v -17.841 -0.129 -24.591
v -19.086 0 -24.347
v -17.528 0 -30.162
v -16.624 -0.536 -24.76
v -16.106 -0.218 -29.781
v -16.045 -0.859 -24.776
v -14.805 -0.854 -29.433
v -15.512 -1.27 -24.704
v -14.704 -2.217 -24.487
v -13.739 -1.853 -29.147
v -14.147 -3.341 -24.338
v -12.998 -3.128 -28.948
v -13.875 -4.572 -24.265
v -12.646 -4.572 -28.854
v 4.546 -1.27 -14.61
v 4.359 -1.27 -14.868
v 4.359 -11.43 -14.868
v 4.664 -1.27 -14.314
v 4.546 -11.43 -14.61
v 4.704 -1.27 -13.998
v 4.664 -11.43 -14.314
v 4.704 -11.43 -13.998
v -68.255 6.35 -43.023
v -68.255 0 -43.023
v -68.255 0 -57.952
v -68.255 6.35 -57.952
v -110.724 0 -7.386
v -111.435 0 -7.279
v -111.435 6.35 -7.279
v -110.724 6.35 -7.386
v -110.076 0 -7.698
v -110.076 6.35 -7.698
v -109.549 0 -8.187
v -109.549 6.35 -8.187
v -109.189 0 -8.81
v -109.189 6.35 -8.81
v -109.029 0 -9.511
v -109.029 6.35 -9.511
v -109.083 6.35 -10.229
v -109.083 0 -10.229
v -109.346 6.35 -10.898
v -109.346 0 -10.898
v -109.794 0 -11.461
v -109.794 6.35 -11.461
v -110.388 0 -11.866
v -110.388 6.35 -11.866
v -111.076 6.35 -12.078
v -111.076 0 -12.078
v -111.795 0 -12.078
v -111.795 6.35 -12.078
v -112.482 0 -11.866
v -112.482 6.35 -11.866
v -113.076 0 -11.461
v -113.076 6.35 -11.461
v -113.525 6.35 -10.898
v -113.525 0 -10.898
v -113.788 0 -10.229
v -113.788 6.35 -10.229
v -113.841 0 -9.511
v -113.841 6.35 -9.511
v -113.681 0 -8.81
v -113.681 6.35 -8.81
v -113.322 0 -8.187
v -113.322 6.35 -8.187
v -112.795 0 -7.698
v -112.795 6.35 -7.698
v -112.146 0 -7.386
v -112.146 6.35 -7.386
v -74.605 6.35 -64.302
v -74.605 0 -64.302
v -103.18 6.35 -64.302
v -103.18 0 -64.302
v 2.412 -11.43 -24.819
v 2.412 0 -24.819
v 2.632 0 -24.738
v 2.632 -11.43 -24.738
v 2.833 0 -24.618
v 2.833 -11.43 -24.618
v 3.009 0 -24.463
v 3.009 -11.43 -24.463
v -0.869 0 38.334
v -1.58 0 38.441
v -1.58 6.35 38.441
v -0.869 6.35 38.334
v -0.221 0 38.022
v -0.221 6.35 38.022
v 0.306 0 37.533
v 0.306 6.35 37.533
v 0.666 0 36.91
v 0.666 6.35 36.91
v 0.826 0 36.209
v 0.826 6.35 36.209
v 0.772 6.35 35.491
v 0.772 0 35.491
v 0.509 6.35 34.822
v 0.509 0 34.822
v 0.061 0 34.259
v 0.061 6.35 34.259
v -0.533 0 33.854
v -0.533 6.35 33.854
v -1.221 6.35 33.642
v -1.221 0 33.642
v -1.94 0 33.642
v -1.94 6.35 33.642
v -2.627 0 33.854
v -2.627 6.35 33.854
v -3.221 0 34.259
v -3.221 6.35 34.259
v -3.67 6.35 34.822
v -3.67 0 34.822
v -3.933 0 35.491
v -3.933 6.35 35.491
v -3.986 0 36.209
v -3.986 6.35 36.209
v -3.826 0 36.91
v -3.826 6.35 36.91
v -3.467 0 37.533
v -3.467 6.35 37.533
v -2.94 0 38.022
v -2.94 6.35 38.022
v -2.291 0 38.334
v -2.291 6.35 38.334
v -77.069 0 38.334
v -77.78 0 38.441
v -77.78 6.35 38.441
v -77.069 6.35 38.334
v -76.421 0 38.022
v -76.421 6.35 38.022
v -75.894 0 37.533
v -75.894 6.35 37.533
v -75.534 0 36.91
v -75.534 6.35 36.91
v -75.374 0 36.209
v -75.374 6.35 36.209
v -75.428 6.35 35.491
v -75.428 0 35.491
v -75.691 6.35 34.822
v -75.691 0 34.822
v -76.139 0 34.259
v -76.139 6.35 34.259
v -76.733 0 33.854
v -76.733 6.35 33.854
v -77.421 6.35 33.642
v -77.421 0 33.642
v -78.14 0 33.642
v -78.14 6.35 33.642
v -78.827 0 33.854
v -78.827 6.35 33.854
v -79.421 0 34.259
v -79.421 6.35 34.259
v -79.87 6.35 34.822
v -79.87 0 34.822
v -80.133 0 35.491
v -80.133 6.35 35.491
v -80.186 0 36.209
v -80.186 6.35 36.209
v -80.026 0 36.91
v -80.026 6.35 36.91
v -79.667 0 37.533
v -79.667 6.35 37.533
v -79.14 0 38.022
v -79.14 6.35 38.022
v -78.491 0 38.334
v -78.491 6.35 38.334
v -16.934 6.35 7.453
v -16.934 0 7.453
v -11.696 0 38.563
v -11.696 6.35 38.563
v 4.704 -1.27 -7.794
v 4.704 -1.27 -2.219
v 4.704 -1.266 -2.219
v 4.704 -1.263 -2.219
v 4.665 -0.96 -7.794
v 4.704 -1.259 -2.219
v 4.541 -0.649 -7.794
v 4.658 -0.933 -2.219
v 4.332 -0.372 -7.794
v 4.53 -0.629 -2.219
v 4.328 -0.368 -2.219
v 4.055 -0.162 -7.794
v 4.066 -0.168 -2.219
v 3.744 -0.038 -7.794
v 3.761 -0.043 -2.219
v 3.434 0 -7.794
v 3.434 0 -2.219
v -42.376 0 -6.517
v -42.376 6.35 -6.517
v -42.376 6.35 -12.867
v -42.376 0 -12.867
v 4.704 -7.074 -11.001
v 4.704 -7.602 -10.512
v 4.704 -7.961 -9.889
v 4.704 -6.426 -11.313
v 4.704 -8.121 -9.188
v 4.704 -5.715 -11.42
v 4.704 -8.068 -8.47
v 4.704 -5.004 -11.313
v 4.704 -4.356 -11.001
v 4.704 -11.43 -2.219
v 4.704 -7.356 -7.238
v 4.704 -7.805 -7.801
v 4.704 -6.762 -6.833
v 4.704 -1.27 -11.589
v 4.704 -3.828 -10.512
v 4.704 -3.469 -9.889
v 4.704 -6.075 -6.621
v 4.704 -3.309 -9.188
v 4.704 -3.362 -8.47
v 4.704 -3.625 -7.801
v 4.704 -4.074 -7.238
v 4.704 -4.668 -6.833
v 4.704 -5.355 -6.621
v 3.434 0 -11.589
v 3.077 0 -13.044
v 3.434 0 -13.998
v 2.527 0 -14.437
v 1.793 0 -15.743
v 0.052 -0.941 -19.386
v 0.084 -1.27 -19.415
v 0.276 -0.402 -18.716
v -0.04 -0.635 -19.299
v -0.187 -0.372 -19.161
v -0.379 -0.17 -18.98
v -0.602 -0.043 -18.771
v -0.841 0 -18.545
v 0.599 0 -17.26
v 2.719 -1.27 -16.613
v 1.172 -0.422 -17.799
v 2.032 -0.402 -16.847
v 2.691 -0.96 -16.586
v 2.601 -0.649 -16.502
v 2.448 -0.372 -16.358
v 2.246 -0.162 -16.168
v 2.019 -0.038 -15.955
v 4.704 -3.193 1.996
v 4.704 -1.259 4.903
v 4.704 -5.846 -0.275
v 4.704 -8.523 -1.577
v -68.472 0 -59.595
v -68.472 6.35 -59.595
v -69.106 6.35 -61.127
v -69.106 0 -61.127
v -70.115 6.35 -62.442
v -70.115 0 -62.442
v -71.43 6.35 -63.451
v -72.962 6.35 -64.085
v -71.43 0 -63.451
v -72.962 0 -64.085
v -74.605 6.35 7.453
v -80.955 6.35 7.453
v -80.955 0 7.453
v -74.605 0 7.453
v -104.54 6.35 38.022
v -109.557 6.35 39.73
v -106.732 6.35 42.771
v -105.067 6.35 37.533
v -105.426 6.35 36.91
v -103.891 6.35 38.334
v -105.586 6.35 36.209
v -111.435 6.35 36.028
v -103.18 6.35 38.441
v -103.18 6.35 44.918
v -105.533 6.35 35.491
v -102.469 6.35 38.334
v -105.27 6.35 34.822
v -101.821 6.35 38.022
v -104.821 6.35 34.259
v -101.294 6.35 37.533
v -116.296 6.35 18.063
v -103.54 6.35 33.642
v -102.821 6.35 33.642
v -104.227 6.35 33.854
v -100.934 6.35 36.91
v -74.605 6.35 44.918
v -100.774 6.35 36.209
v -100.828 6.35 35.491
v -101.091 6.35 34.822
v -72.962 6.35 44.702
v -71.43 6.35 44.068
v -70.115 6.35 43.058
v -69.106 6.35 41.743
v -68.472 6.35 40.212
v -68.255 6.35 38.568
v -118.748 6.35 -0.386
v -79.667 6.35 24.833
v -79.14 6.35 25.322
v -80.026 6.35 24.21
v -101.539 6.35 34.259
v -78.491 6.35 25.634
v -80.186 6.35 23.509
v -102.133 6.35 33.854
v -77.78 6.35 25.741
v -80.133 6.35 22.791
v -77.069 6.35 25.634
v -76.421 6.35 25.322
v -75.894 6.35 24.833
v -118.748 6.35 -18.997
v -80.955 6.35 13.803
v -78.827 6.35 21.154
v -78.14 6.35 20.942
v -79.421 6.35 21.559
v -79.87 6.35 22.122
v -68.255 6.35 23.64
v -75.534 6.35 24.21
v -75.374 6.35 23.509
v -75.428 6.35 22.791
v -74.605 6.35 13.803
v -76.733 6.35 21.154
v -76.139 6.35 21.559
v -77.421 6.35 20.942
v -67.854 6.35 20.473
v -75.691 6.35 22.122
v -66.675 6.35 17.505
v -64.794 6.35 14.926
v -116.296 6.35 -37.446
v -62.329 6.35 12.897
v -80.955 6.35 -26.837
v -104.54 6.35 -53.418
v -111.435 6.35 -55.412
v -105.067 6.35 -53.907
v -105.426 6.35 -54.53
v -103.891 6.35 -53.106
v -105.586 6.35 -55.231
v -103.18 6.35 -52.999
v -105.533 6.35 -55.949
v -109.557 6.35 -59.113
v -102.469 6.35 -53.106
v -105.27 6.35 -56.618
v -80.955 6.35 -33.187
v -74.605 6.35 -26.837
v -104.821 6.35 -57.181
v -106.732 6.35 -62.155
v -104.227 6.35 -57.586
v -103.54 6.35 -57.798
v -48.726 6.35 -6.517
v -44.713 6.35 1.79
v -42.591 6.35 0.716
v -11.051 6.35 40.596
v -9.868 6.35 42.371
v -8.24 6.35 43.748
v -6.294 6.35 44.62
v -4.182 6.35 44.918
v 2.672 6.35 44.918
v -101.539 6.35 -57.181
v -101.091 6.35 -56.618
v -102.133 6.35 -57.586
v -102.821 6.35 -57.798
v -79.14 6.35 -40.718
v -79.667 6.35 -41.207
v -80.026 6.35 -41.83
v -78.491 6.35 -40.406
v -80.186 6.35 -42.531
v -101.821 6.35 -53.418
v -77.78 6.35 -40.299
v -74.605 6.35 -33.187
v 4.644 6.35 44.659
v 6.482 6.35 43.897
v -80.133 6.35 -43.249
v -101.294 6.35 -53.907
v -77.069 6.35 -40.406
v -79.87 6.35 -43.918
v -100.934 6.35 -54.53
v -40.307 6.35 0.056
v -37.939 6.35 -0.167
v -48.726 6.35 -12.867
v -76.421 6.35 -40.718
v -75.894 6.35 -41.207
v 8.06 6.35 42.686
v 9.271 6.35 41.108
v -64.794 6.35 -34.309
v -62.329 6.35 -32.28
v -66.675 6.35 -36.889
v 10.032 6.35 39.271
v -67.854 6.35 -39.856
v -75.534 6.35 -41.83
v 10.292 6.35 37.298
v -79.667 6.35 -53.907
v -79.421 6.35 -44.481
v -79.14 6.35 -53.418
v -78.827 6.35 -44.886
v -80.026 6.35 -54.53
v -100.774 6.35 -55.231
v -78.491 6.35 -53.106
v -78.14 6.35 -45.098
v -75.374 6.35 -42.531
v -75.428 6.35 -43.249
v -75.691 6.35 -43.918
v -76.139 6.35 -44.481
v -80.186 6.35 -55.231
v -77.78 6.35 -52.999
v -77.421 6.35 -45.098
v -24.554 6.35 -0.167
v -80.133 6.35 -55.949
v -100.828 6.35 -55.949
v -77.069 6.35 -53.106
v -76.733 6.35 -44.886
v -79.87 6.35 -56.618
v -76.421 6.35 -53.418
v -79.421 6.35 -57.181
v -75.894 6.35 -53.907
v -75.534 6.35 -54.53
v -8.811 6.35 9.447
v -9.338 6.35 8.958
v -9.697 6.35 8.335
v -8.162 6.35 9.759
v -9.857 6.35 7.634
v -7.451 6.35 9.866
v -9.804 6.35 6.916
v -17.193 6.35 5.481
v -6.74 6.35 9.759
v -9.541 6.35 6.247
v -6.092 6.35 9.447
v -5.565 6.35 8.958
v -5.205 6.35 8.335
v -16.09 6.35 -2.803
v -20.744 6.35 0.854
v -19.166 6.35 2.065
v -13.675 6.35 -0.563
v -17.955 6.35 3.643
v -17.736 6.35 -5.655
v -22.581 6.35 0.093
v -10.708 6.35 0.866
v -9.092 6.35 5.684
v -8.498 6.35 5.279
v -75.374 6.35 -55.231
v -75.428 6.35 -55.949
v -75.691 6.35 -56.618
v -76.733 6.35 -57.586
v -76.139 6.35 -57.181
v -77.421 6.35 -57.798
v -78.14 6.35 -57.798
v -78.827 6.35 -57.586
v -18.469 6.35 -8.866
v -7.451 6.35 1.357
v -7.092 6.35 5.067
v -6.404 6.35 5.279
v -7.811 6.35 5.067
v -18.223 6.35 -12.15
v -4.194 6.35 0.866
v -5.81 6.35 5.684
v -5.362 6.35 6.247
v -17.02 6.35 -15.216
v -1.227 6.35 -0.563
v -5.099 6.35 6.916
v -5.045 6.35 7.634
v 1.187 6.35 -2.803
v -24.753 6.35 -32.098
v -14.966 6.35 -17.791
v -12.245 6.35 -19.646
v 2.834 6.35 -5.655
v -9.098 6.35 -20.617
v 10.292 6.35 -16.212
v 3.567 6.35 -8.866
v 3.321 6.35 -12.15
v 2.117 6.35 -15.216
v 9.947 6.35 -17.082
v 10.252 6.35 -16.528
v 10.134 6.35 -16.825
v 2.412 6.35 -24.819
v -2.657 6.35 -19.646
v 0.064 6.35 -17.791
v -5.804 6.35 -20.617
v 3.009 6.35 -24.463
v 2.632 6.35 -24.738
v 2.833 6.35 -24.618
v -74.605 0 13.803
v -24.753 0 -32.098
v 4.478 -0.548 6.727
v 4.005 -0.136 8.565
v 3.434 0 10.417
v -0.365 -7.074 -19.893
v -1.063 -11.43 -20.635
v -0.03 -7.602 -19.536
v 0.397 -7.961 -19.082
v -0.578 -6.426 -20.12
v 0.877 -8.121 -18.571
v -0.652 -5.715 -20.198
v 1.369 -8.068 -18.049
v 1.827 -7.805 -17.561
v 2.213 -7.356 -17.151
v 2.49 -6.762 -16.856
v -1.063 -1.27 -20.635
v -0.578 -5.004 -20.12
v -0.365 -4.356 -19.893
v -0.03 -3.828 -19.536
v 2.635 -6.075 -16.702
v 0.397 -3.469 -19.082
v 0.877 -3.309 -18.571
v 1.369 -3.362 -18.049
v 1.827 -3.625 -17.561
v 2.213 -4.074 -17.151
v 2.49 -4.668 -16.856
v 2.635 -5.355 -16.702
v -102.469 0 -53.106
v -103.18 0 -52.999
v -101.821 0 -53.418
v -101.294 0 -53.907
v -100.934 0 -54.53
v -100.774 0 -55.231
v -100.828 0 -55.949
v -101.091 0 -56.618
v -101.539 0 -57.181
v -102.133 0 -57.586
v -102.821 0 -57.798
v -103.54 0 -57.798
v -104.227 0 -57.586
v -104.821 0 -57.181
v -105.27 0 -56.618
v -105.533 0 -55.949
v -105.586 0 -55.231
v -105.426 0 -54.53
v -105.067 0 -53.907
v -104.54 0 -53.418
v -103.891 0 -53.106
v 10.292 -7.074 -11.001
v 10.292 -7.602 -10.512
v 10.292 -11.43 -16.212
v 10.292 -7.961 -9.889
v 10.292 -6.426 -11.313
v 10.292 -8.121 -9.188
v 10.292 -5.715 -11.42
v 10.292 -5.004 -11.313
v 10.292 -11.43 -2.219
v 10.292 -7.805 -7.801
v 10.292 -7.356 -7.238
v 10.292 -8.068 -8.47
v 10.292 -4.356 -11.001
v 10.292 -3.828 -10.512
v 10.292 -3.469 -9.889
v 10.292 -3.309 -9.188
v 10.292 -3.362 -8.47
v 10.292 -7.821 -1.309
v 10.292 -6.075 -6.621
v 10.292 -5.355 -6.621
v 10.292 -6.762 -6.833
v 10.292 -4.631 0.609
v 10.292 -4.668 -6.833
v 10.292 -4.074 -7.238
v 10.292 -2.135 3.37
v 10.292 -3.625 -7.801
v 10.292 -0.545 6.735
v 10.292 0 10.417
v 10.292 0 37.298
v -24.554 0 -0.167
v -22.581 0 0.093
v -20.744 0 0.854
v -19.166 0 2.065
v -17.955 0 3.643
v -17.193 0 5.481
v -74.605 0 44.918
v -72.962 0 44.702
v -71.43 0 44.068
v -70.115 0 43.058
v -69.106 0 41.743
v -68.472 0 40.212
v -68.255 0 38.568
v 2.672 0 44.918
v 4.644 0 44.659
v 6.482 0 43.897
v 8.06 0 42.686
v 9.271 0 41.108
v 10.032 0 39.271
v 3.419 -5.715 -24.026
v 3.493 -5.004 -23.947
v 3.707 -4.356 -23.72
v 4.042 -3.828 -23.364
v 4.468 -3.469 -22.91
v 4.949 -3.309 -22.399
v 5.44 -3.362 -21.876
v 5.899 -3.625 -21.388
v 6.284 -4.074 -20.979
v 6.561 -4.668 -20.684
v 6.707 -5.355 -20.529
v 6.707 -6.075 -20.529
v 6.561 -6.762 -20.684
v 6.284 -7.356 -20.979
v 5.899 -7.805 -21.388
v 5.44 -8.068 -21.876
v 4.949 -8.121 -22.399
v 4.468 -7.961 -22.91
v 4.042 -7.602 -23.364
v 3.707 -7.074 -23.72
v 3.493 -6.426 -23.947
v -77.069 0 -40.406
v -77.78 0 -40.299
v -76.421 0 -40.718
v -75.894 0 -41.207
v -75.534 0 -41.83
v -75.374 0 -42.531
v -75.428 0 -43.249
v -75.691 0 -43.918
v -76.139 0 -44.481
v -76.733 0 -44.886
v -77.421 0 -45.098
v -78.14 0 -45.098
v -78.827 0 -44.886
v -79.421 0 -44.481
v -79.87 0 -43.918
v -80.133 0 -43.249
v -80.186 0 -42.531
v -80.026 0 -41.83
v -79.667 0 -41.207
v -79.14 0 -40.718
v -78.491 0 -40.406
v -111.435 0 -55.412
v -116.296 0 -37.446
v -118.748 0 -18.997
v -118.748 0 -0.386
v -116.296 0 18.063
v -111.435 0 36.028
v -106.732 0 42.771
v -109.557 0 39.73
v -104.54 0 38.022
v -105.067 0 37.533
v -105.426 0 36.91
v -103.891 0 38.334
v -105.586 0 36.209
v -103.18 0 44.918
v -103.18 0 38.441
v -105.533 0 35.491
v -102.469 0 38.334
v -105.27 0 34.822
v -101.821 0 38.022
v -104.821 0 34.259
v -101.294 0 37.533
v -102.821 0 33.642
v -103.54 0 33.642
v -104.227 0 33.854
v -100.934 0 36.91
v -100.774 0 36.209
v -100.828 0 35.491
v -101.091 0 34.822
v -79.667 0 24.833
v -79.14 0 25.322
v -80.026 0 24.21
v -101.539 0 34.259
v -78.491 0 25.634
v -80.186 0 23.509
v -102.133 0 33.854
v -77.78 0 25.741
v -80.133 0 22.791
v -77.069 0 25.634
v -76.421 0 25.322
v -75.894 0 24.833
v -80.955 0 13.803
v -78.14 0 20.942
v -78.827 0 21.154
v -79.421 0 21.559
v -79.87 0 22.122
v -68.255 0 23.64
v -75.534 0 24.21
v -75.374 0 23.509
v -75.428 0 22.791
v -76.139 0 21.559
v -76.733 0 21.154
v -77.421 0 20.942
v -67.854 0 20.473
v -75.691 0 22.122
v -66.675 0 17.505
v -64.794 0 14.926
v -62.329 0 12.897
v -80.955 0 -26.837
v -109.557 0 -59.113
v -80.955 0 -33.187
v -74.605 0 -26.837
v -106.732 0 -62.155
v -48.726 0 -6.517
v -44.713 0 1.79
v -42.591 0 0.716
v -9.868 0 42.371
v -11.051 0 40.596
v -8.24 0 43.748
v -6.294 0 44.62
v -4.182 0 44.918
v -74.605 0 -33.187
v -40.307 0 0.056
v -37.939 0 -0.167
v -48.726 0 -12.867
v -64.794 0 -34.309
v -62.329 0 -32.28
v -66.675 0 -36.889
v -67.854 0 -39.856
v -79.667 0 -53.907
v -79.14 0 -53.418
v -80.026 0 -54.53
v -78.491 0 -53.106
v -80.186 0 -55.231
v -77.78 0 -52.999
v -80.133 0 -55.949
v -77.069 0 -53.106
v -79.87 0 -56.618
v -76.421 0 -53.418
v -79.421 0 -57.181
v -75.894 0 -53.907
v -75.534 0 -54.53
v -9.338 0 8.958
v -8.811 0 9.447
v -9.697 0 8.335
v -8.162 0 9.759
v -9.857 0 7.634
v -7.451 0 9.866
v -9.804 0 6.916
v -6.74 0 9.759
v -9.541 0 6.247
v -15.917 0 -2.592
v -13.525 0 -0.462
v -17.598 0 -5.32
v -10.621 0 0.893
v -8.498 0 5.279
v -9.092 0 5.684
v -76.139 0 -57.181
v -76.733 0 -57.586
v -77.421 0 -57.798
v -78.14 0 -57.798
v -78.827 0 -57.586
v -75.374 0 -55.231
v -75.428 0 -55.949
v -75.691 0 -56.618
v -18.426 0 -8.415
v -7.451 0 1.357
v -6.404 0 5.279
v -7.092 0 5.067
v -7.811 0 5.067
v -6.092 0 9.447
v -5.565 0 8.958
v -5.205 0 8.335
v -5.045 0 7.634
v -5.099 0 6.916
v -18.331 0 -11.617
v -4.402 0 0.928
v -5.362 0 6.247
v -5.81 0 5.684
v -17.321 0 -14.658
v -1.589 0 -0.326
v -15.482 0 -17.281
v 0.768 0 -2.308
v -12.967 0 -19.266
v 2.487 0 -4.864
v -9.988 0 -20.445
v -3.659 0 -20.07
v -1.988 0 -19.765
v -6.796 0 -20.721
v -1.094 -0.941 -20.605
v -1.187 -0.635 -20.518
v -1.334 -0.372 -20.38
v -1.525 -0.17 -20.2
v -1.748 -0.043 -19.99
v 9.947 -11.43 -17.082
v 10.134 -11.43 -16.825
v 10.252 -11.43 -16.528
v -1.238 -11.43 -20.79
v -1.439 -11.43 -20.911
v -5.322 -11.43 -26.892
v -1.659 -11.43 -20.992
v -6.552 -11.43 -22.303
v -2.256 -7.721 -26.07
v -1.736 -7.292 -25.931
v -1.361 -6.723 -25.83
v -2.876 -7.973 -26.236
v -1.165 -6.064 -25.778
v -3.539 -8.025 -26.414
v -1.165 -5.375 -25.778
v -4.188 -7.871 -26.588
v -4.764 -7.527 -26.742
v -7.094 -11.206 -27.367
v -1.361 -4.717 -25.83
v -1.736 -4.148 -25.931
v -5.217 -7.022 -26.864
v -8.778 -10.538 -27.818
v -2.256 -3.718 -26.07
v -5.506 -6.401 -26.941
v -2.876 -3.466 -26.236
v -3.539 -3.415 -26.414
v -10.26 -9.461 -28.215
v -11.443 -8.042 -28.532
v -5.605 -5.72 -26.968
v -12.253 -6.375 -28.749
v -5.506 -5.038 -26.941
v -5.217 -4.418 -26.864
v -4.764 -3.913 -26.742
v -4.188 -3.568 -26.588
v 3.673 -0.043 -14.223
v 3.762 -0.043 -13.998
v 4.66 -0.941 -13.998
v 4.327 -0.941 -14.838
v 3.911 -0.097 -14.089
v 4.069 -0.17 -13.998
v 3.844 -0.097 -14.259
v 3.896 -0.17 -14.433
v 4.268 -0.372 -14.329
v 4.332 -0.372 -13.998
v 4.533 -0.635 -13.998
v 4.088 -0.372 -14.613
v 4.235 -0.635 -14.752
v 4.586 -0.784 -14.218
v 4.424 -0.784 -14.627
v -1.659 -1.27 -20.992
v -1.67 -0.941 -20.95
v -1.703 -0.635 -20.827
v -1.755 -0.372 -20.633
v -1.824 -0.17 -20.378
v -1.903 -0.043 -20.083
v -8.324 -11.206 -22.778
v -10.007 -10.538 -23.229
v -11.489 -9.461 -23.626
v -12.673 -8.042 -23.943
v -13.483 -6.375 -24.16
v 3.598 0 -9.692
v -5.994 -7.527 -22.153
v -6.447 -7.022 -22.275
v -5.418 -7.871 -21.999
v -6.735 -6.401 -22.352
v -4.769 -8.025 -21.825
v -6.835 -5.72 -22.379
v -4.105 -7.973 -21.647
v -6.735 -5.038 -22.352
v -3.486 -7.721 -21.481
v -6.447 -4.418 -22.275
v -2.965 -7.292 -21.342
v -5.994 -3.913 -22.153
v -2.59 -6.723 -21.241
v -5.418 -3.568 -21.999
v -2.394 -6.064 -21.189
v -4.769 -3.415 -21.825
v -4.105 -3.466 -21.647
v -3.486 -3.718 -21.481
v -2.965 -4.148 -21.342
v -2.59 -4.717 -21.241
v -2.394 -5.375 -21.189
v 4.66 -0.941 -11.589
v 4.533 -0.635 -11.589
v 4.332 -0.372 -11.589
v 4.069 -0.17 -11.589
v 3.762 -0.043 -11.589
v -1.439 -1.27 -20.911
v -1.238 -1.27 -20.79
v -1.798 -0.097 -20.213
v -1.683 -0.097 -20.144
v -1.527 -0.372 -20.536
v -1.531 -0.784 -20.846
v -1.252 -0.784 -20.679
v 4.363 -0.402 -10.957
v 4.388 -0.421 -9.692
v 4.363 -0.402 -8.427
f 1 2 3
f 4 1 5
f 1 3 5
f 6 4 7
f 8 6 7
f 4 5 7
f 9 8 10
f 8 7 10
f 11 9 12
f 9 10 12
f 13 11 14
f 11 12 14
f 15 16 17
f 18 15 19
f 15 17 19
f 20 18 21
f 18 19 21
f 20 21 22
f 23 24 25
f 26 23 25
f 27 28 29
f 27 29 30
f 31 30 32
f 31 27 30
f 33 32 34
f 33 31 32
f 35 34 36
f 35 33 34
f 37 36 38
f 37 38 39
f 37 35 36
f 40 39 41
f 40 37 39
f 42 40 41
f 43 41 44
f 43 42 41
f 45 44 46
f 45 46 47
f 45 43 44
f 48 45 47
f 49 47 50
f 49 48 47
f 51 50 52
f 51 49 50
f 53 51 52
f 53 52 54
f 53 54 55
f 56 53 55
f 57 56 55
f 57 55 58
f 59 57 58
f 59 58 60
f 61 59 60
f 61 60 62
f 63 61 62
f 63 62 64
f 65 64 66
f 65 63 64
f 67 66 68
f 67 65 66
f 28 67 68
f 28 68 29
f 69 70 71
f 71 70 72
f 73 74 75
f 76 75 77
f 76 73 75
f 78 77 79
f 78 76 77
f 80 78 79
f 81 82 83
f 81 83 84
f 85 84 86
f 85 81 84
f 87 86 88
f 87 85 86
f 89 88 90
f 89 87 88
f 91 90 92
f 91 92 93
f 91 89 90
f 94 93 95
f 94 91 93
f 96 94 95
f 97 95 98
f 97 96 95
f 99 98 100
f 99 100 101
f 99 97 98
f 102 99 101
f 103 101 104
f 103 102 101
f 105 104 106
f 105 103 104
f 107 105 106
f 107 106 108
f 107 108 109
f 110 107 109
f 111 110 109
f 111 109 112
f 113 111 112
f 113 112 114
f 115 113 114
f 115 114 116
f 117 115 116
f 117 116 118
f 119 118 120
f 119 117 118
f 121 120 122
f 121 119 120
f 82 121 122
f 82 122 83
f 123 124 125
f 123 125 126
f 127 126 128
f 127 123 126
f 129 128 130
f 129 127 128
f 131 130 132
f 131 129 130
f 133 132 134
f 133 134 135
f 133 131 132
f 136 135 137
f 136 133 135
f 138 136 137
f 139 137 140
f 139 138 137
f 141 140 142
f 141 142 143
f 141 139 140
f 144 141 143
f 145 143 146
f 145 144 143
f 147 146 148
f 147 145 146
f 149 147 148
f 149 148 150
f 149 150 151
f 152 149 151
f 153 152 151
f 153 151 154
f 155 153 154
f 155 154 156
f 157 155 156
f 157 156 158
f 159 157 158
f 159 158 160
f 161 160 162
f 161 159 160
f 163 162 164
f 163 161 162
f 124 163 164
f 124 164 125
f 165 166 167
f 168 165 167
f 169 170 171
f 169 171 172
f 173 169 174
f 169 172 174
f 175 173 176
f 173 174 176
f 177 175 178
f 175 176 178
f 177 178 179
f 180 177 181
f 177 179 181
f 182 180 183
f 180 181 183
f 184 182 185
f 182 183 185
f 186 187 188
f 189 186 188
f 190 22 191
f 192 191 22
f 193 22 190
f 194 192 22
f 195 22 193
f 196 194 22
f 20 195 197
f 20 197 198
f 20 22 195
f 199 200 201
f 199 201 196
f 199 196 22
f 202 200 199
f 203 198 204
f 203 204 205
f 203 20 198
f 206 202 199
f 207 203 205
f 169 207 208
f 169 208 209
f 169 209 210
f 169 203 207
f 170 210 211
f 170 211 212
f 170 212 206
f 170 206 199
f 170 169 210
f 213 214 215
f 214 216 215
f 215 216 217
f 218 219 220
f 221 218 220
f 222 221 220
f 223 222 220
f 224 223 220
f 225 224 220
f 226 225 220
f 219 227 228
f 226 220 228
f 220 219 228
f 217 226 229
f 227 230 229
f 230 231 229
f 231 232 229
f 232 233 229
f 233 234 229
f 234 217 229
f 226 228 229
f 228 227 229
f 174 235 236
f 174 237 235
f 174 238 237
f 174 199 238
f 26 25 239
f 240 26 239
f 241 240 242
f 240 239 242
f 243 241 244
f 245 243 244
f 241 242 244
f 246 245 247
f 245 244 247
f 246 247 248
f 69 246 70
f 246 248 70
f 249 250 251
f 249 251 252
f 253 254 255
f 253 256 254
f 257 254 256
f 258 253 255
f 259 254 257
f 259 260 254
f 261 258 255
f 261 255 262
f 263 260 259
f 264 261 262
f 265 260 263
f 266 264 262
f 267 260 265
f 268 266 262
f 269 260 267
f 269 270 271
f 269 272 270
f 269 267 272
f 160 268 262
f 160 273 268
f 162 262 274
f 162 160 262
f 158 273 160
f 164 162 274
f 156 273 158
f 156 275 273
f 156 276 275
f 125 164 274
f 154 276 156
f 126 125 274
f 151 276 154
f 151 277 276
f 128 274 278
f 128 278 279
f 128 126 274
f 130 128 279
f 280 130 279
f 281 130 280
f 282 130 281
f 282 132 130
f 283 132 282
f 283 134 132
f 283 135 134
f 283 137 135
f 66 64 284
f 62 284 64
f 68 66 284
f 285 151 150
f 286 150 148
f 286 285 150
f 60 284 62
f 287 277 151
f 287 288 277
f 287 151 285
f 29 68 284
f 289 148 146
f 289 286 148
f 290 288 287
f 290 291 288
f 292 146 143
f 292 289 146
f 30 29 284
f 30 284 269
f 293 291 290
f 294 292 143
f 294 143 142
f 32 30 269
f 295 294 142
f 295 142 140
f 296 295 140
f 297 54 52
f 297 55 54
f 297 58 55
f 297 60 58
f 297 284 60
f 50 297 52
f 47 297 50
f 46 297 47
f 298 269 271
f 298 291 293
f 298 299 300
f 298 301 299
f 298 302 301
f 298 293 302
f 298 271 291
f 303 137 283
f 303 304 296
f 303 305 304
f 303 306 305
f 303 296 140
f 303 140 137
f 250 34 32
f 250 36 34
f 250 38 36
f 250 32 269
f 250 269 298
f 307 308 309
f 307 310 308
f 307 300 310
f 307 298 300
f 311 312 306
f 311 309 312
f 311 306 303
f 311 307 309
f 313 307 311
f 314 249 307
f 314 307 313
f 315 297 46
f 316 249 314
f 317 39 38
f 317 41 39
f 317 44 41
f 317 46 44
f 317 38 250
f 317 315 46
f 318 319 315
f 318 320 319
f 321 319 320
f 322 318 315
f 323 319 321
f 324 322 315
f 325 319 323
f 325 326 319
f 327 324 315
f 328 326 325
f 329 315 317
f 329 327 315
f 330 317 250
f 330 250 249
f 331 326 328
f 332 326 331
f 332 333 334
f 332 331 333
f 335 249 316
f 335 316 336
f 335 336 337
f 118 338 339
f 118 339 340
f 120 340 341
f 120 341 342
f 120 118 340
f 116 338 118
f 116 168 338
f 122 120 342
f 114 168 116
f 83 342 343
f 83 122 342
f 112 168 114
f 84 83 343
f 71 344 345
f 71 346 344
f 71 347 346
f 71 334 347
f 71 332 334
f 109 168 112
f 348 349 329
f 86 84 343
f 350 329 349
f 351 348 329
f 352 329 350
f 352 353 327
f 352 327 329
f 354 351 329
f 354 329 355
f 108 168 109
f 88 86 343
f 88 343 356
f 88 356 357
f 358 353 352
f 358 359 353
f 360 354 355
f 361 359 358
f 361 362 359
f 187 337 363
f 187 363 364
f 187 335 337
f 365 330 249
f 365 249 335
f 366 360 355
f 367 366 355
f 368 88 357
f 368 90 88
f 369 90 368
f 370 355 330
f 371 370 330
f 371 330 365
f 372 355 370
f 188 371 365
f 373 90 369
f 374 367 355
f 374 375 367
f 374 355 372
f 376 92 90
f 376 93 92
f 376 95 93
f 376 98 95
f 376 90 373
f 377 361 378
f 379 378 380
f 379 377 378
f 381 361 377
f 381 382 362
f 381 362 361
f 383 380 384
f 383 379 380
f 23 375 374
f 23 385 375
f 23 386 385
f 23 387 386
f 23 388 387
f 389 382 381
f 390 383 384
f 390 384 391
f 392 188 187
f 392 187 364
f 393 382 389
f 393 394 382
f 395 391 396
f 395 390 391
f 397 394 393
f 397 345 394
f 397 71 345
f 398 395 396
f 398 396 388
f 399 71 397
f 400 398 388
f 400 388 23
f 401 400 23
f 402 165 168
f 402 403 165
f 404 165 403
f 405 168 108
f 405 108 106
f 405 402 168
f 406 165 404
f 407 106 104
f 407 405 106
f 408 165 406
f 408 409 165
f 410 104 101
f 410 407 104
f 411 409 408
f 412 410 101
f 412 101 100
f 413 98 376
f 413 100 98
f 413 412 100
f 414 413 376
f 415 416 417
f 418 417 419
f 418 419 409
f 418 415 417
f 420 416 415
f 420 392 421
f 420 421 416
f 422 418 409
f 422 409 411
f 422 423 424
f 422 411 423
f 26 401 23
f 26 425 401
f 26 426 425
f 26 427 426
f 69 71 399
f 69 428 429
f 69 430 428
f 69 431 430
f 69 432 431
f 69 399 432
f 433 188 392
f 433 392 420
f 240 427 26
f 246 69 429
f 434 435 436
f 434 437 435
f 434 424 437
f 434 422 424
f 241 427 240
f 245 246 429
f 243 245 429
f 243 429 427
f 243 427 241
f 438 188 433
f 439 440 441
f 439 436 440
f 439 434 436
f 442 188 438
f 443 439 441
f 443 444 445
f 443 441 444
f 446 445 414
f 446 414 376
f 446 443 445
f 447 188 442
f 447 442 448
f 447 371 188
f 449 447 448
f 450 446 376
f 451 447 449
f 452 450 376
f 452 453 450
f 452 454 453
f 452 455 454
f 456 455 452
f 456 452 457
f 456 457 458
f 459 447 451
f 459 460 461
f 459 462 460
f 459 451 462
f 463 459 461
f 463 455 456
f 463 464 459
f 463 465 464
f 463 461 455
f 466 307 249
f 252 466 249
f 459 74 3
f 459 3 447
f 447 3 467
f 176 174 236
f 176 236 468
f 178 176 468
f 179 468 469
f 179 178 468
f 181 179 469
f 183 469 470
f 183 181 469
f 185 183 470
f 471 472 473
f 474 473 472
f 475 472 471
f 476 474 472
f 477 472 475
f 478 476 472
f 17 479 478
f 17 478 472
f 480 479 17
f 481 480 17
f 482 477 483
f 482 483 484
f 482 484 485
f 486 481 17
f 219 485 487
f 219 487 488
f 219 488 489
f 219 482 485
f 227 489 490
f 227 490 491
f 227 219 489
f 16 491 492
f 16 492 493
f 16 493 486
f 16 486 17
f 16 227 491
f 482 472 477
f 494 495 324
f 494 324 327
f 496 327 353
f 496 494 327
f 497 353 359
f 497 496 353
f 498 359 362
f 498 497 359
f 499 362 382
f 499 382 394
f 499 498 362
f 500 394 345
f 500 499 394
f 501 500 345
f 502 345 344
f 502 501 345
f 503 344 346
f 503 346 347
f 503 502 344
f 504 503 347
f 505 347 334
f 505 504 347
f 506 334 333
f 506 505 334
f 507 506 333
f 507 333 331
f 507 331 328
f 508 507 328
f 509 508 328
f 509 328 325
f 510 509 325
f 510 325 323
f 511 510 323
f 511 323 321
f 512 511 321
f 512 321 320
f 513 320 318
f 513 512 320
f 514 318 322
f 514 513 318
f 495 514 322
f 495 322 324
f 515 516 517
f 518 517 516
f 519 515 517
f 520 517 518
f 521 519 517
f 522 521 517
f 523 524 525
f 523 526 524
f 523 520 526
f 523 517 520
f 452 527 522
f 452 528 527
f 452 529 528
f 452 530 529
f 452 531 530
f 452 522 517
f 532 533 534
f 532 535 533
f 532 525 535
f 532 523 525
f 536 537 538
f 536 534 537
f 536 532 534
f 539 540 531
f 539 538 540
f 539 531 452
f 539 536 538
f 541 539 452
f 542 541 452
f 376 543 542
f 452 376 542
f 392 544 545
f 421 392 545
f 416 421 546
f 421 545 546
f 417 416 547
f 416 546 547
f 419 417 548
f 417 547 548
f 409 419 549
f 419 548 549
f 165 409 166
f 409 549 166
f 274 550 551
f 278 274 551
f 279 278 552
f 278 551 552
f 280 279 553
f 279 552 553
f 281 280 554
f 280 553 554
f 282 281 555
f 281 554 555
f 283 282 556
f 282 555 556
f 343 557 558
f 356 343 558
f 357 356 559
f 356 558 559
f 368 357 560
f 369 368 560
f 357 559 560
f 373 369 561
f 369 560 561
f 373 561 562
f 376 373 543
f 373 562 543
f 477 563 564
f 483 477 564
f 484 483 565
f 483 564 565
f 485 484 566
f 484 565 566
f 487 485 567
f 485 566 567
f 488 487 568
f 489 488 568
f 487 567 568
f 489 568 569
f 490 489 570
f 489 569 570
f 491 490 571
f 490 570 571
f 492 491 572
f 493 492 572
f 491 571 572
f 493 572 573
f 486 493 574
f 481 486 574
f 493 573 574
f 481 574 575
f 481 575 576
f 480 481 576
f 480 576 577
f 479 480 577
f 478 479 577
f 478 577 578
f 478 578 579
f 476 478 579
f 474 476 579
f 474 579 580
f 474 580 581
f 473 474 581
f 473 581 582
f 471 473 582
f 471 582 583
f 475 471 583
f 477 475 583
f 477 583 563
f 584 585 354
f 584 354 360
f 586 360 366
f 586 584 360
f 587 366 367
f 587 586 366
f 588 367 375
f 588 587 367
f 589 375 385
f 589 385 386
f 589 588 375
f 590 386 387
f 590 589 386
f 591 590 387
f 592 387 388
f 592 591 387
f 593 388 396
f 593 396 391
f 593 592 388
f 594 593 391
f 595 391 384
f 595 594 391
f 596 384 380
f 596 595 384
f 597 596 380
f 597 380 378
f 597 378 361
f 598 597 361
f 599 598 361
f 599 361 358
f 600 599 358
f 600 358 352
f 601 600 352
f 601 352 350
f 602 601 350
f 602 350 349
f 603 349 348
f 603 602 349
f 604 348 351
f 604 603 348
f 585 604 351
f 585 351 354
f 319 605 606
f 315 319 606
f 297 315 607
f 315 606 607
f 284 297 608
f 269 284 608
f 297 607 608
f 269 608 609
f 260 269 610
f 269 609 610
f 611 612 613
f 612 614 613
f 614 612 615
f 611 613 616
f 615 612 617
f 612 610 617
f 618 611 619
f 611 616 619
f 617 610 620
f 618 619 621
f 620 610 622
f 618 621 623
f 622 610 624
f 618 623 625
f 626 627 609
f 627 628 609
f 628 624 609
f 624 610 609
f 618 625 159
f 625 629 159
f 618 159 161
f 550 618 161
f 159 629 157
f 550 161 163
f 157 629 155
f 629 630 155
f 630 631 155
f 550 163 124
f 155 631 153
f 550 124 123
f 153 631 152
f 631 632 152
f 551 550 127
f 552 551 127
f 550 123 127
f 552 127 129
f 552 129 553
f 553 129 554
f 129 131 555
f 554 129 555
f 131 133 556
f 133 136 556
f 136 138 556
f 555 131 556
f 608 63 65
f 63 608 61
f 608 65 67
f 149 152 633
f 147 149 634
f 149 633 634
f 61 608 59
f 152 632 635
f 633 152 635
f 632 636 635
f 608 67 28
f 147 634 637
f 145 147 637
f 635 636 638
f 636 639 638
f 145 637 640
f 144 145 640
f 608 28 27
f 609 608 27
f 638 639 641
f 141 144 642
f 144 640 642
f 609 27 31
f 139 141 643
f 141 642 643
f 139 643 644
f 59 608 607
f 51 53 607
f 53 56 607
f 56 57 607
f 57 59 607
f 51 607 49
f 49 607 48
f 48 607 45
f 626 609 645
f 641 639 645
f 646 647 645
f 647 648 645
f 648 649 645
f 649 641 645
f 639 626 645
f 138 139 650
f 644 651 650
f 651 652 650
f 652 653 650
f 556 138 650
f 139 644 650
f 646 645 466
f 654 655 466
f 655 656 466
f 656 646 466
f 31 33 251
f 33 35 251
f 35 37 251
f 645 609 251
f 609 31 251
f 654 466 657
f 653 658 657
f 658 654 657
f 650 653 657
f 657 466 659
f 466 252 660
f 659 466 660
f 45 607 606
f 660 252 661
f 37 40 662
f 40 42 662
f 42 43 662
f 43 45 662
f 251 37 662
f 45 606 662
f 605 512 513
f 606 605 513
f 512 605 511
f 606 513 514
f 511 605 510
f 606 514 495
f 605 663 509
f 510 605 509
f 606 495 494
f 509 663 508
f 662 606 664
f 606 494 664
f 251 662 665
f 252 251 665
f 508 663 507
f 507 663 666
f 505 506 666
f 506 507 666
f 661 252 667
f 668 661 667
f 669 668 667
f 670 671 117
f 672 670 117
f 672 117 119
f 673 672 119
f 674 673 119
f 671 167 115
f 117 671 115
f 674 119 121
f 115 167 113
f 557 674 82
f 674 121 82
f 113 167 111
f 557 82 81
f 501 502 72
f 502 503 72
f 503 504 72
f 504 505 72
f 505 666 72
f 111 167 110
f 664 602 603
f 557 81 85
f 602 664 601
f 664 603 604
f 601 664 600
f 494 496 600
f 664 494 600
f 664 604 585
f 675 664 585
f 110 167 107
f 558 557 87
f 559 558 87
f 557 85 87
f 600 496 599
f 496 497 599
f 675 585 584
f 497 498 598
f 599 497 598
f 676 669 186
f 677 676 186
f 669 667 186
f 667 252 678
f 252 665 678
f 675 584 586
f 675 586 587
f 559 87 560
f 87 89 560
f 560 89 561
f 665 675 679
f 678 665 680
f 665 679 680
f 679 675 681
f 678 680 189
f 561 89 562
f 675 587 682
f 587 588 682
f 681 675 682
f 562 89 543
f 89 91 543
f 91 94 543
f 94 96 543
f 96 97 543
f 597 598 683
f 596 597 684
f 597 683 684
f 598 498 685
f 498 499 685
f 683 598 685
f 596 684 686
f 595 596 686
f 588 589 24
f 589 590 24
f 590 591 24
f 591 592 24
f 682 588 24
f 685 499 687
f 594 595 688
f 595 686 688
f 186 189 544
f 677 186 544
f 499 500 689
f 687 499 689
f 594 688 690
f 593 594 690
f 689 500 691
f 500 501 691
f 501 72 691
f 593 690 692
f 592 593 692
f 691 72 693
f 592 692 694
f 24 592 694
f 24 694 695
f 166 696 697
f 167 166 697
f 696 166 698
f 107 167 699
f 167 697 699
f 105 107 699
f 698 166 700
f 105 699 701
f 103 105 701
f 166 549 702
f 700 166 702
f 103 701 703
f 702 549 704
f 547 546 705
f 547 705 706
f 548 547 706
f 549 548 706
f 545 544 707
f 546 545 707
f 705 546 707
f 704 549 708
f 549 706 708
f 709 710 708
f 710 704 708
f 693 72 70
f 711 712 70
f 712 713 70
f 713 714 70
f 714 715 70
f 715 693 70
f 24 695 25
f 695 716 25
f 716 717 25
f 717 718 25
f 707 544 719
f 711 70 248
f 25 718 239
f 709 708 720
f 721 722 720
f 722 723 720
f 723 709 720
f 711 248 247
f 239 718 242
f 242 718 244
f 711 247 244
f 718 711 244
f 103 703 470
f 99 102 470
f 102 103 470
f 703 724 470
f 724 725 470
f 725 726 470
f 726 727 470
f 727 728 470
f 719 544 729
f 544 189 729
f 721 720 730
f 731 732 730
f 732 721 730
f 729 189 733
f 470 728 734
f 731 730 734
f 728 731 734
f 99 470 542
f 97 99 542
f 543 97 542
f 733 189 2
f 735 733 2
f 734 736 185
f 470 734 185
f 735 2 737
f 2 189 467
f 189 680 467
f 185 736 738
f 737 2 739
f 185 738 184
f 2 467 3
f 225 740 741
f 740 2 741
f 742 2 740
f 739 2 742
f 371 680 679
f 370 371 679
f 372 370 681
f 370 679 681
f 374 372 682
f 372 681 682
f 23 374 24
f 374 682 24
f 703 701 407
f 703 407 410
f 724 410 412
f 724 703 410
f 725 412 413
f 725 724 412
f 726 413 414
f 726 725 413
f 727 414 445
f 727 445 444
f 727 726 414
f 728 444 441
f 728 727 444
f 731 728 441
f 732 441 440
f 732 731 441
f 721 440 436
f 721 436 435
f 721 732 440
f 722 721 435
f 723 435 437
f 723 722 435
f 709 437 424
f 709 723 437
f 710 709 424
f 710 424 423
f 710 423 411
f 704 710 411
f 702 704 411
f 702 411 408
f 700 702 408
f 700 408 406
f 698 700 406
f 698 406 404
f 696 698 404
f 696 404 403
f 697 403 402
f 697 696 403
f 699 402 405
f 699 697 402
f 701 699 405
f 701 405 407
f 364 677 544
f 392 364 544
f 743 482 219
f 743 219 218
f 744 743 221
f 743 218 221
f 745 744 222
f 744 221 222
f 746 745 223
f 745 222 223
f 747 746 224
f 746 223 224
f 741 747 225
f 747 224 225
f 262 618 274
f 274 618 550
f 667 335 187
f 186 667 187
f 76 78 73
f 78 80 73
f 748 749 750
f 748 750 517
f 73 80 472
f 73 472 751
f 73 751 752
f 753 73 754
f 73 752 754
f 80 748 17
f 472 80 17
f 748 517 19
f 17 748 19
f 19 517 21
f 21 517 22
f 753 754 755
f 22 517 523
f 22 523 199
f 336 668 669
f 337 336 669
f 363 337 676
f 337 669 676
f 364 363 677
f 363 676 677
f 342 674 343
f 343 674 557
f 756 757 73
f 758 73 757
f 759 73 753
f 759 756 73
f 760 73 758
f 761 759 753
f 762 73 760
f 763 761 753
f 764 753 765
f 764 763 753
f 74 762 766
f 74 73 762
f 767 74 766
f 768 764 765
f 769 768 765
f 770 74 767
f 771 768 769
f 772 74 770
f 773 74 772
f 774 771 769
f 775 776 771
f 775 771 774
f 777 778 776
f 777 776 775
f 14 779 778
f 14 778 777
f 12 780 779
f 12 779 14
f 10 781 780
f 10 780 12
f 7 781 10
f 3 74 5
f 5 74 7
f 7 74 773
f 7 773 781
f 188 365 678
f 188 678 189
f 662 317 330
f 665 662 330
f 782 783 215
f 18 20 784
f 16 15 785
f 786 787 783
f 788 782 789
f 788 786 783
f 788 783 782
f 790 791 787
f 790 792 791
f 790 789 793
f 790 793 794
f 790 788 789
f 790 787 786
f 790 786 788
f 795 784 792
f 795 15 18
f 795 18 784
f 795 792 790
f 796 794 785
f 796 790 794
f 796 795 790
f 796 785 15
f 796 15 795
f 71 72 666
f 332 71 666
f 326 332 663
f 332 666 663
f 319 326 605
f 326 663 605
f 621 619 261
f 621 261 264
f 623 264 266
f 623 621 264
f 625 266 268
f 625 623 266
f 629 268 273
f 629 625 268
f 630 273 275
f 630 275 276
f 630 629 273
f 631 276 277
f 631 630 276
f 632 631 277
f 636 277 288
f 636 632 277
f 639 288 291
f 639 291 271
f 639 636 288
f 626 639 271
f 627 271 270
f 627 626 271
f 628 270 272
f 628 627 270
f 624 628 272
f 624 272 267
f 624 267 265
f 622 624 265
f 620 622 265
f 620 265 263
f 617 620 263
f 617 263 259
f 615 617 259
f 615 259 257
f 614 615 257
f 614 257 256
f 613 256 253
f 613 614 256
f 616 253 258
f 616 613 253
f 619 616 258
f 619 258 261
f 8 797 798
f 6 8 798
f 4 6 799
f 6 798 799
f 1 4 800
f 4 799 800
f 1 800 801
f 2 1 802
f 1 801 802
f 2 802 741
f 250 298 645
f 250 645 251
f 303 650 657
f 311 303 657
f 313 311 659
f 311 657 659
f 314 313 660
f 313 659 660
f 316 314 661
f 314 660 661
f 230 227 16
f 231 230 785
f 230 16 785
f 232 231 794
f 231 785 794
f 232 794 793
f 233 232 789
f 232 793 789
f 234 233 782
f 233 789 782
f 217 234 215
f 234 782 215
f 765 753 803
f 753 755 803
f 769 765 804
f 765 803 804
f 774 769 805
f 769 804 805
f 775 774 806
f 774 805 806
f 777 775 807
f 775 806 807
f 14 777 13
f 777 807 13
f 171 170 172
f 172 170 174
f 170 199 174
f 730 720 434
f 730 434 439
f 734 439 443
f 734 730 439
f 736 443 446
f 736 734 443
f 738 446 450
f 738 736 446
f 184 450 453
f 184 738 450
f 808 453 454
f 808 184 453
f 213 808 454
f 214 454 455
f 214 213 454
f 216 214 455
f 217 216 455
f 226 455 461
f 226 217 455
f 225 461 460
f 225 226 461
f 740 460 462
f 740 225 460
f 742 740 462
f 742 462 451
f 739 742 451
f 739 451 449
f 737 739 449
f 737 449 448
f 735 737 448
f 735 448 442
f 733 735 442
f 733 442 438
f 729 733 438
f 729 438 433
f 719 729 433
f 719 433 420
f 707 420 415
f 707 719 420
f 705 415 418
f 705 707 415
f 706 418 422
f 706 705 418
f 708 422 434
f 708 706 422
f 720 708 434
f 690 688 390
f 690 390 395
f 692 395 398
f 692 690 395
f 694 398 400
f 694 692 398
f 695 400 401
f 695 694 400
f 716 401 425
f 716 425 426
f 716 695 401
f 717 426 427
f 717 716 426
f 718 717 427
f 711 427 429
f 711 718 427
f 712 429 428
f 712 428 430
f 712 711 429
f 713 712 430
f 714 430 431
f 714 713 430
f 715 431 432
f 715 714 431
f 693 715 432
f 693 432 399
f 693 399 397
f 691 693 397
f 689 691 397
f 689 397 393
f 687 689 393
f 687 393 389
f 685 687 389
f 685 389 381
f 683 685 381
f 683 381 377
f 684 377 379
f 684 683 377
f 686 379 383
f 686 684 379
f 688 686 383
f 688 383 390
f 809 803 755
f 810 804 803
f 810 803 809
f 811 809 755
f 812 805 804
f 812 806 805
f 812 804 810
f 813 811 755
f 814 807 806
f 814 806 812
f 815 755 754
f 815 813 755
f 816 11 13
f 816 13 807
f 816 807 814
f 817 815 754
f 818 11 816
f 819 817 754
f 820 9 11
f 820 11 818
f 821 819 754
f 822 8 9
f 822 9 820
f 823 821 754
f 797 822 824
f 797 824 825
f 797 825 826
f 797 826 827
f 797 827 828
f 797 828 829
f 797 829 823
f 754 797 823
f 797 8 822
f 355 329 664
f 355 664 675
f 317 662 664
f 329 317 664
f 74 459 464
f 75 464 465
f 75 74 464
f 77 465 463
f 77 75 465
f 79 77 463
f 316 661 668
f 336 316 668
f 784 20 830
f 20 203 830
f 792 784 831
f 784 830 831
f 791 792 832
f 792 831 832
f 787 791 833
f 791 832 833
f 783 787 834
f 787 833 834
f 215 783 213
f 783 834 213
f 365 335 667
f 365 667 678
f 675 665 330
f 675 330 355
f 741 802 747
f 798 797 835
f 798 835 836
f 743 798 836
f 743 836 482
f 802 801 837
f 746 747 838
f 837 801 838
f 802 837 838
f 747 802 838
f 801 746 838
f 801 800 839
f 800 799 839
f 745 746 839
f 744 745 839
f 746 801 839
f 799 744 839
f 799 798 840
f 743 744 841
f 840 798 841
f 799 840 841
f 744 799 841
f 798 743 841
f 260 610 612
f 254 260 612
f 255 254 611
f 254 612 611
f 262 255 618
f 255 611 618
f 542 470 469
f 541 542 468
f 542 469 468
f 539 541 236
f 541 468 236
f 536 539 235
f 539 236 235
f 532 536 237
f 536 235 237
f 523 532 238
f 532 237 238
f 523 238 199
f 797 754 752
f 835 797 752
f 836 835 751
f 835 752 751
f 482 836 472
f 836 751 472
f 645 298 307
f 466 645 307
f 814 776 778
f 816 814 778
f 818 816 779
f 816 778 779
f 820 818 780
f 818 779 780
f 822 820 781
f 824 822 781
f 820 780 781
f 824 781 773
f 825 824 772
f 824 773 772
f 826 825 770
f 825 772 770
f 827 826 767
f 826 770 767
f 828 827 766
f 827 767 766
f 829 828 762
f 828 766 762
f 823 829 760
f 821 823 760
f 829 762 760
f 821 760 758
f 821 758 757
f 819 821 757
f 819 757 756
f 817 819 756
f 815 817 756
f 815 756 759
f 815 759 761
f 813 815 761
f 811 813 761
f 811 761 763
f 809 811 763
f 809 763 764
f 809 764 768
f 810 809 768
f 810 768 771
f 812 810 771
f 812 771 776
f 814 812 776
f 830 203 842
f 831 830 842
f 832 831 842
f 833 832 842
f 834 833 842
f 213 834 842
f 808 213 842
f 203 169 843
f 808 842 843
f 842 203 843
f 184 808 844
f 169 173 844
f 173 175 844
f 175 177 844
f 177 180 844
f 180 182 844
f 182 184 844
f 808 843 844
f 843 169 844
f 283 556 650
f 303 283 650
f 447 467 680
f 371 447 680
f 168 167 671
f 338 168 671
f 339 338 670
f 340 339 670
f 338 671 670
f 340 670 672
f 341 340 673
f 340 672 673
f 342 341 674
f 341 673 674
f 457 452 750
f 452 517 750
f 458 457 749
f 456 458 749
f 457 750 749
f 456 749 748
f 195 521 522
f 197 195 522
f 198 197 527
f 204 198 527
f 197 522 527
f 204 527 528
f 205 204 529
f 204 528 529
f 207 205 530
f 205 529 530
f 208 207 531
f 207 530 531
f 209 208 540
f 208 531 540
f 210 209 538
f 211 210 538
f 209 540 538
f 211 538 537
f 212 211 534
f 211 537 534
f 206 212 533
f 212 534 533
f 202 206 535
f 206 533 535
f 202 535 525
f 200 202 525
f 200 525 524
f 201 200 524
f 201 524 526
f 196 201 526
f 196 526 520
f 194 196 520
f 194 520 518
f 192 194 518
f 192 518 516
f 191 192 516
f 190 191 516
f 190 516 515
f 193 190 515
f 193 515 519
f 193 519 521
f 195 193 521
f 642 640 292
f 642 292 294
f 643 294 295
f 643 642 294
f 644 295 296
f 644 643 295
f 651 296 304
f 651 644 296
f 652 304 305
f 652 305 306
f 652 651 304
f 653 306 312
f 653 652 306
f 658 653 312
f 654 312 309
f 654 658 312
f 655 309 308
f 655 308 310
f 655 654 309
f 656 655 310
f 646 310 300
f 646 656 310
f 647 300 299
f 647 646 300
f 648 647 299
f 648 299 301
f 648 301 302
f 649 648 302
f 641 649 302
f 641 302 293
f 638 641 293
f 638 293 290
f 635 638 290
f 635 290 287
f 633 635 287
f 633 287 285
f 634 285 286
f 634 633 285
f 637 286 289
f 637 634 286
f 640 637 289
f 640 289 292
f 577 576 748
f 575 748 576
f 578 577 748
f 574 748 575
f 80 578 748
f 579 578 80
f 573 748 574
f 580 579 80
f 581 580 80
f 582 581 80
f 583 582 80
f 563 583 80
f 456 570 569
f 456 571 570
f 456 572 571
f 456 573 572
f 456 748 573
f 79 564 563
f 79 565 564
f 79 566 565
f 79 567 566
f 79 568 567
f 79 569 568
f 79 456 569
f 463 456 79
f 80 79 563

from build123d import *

# Parameters (mm, degrees)
SKETCH1_R           = 2.413
SKETCH1_W           = 6.35
SKETCH1_H           = 6.35
SKETCH1_R_2         = 11.049
BOSS_EXTRUDE1_DEPTH = 6.35
BOSS_EXTRUDE4_DEPTH = 11.43
SKETCH7_R           = 2.413
CUT_EXTRUDE4_DEPTH  = 11.43
SKETCH8_R           = 2.413
CUT_EXTRUDE5_DEPTH  = 11.43
BOSS_EXTRUDE5_DEPTH = 11.43
SKETCH14_R          = 2.3114
CUT_EXTRUDE8_DEPTH  = 21.844
CUT_EXTRUDE9_DEPTH  = 21.844
FILLET3_R           = 1.27
FILLET4_R           = 5.08
FILLET5_R           = 7.62
FILLET6_START       = 3.433618276
FILLET6_DEPTH       = 6.8580001
FILLET6_START_2     = -2.219498454
FILLET6_2_DEPTH     = 12.636340452


with BuildPart() as part:
    # Sketch1 → Boss-Extrude1 (new body)
    with BuildSketch(Plane(origin=(0, 0, 0), x_dir=(1, 0, 0), z_dir=(0, 1, 0))):
        with BuildLine():
            ThreePointArc((-44.712520386, -1.790319958), (-41.464378908, -0.332372105), (-37.939187052, 0.166684391))
            Line((-37.939187052, 0.166684391), (-27.387614836, 0.166684391))
            Line((-27.387614836, 0.166684391), (-24.553673229, 0.166684391))
            ThreePointArc((-24.553673229, 0.166684391), (-19.165519557, -2.065161936), (-16.933673229, -7.453315609))
            Line((-16.933673229, -7.453315609), (-11.696120928, -38.563381903))
            ThreePointArc((-11.696120928, -38.563381903), (-9.102466616, -43.116571583), (-4.181867321, -44.918315609))
            Line((-4.181867321, -44.918315609), (2.671618376, -44.918315609))
            ThreePointArc((2.671618376, -44.918315609), (8.059772048, -42.686469281), (10.291618376, -37.298315609))
            Line((10.291618376, -37.298315609), (10.291618376, -36.576031258))
            Line((10.291618376, -36.576031258), (10.291618376, 31.928258006))
            Line((10.291618376, 31.928258006), (-62.328552859, 32.280391547))
            ThreePointArc((-62.328552859, 32.280391547), (-66.67527648, 36.888704376), (-68.255219526, 43.023387198))
            Line((-68.255219526, 43.023387198), (-68.255219526, 57.951684391))
            ThreePointArc((-68.255219526, 57.951684391), (-70.115091465, 62.441812452), (-74.605219526, 64.301684391))
            Line((-74.605219526, 64.301684391), (-103.180219526, 64.301684391))
            ThreePointArc((-103.180219526, 64.301684391), (-108.250679153, 60.73228976), (-111.435219526, 55.411684391))
            ThreePointArc((-111.435219526, 55.411684391), (-119.055219526, 9.691684391), (-111.435219526, -36.028315609))
            ThreePointArc((-111.435219526, -36.028315609), (-108.250679153, -41.348920977), (-103.180219526, -44.918315609))
            Line((-103.180219526, -44.918315609), (-74.605219526, -44.918315609))
            ThreePointArc((-74.605219526, -44.918315609), (-70.115091465, -43.058443669), (-68.255219526, -38.568315609))
            Line((-68.255219526, -38.568315609), (-68.255219526, -23.640018416))
            ThreePointArc((-68.255219526, -23.640018416), (-66.67527648, -17.505335593), (-62.328552859, -12.897022765))
            Line((-62.328552859, -12.897022765), (-44.712520386, -1.790319958))
        make_face()
        with Locations(Location((-103.180219526, -36.028315609, 0), (0, 0, 270))):
            Circle(SKETCH1_R, mode=Mode.SUBTRACT)
        with Locations(Location((-77.780219526, -36.028315609, 0), (0, 0, 270))):
            Circle(SKETCH1_R, mode=Mode.SUBTRACT)
        with Locations(Location((-77.780219526, -23.328315609, 0), (0, 0, 270))):
            Circle(SKETCH1_R, mode=Mode.SUBTRACT)
        with Locations((-77.780219526, -10.628315609)):
            Rectangle(SKETCH1_W, SKETCH1_H, mode=Mode.SUBTRACT)
        with Locations(Location((-1.580219526, -36.028315609, 0), (0, 0, 270))):
            Circle(SKETCH1_R, mode=Mode.SUBTRACT)
        with Locations(Location((-7.451232573, -7.453315609, 0), (0, 0, 270))):
            Circle(SKETCH1_R, mode=Mode.SUBTRACT)
        with Locations(Location((-111.435219526, 9.691684391, 0), (0, 0, 270))):
            Circle(SKETCH1_R, mode=Mode.SUBTRACT)
        with Locations((-77.780219526, 30.011684391)):
            Rectangle(SKETCH1_W, SKETCH1_H, mode=Mode.SUBTRACT)
        with Locations(Location((-103.180219526, 55.411684391, 0), (0, 0, 270))):
            Circle(SKETCH1_R, mode=Mode.SUBTRACT)
        with Locations(Location((-77.780219526, 42.711684391, 0), (0, 0, 270))):
            Circle(SKETCH1_R, mode=Mode.SUBTRACT)
        with Locations(Location((-77.780219526, 55.411684391, 0), (0, 0, 270))):
            Circle(SKETCH1_R, mode=Mode.SUBTRACT)
        with Locations((-45.551232573, 9.691684391)):
            Rectangle(SKETCH1_W, SKETCH1_H, mode=Mode.SUBTRACT)
        with Locations(Location((-7.451232573, 9.691684391, 0), (0, 0, 270))):
            Circle(SKETCH1_R_2, mode=Mode.SUBTRACT)
    extrude(amount=BOSS_EXTRUDE1_DEPTH)



with BuildPart() as body_2:
    # Sketch6 → Boss-Extrude4 (new body)
    with BuildSketch(Plane.XZ):
        Polygon((10.291618376, -2.219498454), (10.291618376, -16.715666773), (2.76121074, -24.725802919), (-1.31013754, -20.898288428), (4.703618376, -14.501423083), (4.703618376, -2.219498454), align=None)
    extrude(amount=BOSS_EXTRUDE4_DEPTH)

    # Sketch7 → Cut-Extrude4 (cut)
    with BuildSketch(Plane(origin=(13.805123423, 0, -12.978332071), x_dir=(-0.6849524859235093, 0, -0.7285877380434048), z_dir=(0.7285877380434048, 0, -0.6849524859235093))):
        with Locations((12.749560253, -5.715)):
            Circle(SKETCH7_R)
    extrude(amount=-CUT_EXTRUDE4_DEPTH, mode=Mode.SUBTRACT)

    # Sketch8 → Cut-Extrude5 (cut)
    with BuildSketch(Plane(origin=(10.291618376, 0, 0), x_dir=(0, 0, -1), z_dir=(1, 0, 0))):
        with Locations((9.007351169, -5.715)):
            Circle(SKETCH8_R)
    extrude(amount=-CUT_EXTRUDE5_DEPTH, mode=Mode.SUBTRACT)


with BuildPart() as part_1:
    add(part.part)

    add(body_2.part)  # Boss-Extrude5 merges body 2
    # Sketch13 → Boss-Extrude5 (add)
    with BuildSketch(Plane.XZ):
        Polygon((2.76121074, -24.725802919), (-12.621219973, -28.847512806), (-13.850827217, -24.258556099), (-1.31013754, -20.898288428), align=None)
    extrude(amount=BOSS_EXTRUDE5_DEPTH)

    # Sketch14 → Cut-Extrude8 (cut)
    with BuildSketch(Plane(origin=(6.366416777, 0, -23.759790873), x_dir=(-0.9659258262890685, 0, -0.2588190451025197), z_dir=(0.2588190451025197, 0, -0.9659258262890685))):
        with Locations((10.082383935, -5.719726248)):
            Circle(SKETCH14_R)
    extrude(amount=-CUT_EXTRUDE8_DEPTH, mode=Mode.SUBTRACT)

    # Sketch15 → Cut-Extrude9 (cut)
    with BuildSketch(Plane.XZ):
        Polygon((10.291618376, -16.715666773), (2.76121074, -24.725802919), (-24.752905313, -32.098188096), (10.291618376, -31.928258006), align=None)
    extrude(amount=-CUT_EXTRUDE9_DEPTH, mode=Mode.SUBTRACT)

    # Fillet3
    fillet3_edges = [part_1.edges().sort_by_distance(p)[0] for p in [
        (2.76121074, -2.54, -24.725802919),
        (-1.31013754, -5.715, -20.898288428),
        (-7.580482379, 0, -22.578422263),
        (4.703618376, 0, -8.360460768),
        (1.696740418, 0, -17.699855755),
        (4.703618376, -5.715, -14.501423083),
        (10.291618376, -2.54, -16.715666773),
    ]]
    fillet(fillet3_edges, radius=FILLET3_R)

    # Fillet4
    fillet4_edges = [part_1.edges().sort_by_distance(p)[0] for p in [
        (-13.400373689, 0, -25.939671553),
    ]]
    fillet(fillet4_edges, radius=FILLET4_R)

    # Fillet5
    fillet5_edges = [part_1.edges().sort_by_distance(p)[0] for p in [
        (-13.236023595, -11.43, -26.553034453),
    ]]
    fillet(fillet5_edges, radius=FILLET5_R)

    # Fillet6: read off the stored shape, not the designer's step
    # Fillet6 outline → Fillet6 (add)
    with BuildSketch(Plane.YZ.offset(FILLET6_START)):
        with BuildLine():
            Line((0, -2.219498454), (0, 10.416841998))
            ThreePointArc((0, 10.416841998), (-3.281427921, 1.897423003), (-11.43, -2.219498454))
            Line((-11.43, -2.219498454), (0, -2.219498454))
        make_face()
    extrude(amount=FILLET6_DEPTH)

    # Fillet6 2 outline → Fillet6 2 (cut)
    with BuildSketch(Plane.XY.offset(FILLET6_START_2)):
        with BuildLine():
            Line((4.703618377, -13), (4.703573688, -1.259346045))
            ThreePointArc((4.703573688, -1.259346045), (4.327869313, -0.368215513), (3.433618376, 0))
            Line((3.433618376, 0), (3.433618276, -13))
            Line((3.433618276, -13), (4.703618377, -13))
        make_face()
    extrude(amount=FILLET6_2_DEPTH, mode=Mode.SUBTRACT)


solid = part_1.part
